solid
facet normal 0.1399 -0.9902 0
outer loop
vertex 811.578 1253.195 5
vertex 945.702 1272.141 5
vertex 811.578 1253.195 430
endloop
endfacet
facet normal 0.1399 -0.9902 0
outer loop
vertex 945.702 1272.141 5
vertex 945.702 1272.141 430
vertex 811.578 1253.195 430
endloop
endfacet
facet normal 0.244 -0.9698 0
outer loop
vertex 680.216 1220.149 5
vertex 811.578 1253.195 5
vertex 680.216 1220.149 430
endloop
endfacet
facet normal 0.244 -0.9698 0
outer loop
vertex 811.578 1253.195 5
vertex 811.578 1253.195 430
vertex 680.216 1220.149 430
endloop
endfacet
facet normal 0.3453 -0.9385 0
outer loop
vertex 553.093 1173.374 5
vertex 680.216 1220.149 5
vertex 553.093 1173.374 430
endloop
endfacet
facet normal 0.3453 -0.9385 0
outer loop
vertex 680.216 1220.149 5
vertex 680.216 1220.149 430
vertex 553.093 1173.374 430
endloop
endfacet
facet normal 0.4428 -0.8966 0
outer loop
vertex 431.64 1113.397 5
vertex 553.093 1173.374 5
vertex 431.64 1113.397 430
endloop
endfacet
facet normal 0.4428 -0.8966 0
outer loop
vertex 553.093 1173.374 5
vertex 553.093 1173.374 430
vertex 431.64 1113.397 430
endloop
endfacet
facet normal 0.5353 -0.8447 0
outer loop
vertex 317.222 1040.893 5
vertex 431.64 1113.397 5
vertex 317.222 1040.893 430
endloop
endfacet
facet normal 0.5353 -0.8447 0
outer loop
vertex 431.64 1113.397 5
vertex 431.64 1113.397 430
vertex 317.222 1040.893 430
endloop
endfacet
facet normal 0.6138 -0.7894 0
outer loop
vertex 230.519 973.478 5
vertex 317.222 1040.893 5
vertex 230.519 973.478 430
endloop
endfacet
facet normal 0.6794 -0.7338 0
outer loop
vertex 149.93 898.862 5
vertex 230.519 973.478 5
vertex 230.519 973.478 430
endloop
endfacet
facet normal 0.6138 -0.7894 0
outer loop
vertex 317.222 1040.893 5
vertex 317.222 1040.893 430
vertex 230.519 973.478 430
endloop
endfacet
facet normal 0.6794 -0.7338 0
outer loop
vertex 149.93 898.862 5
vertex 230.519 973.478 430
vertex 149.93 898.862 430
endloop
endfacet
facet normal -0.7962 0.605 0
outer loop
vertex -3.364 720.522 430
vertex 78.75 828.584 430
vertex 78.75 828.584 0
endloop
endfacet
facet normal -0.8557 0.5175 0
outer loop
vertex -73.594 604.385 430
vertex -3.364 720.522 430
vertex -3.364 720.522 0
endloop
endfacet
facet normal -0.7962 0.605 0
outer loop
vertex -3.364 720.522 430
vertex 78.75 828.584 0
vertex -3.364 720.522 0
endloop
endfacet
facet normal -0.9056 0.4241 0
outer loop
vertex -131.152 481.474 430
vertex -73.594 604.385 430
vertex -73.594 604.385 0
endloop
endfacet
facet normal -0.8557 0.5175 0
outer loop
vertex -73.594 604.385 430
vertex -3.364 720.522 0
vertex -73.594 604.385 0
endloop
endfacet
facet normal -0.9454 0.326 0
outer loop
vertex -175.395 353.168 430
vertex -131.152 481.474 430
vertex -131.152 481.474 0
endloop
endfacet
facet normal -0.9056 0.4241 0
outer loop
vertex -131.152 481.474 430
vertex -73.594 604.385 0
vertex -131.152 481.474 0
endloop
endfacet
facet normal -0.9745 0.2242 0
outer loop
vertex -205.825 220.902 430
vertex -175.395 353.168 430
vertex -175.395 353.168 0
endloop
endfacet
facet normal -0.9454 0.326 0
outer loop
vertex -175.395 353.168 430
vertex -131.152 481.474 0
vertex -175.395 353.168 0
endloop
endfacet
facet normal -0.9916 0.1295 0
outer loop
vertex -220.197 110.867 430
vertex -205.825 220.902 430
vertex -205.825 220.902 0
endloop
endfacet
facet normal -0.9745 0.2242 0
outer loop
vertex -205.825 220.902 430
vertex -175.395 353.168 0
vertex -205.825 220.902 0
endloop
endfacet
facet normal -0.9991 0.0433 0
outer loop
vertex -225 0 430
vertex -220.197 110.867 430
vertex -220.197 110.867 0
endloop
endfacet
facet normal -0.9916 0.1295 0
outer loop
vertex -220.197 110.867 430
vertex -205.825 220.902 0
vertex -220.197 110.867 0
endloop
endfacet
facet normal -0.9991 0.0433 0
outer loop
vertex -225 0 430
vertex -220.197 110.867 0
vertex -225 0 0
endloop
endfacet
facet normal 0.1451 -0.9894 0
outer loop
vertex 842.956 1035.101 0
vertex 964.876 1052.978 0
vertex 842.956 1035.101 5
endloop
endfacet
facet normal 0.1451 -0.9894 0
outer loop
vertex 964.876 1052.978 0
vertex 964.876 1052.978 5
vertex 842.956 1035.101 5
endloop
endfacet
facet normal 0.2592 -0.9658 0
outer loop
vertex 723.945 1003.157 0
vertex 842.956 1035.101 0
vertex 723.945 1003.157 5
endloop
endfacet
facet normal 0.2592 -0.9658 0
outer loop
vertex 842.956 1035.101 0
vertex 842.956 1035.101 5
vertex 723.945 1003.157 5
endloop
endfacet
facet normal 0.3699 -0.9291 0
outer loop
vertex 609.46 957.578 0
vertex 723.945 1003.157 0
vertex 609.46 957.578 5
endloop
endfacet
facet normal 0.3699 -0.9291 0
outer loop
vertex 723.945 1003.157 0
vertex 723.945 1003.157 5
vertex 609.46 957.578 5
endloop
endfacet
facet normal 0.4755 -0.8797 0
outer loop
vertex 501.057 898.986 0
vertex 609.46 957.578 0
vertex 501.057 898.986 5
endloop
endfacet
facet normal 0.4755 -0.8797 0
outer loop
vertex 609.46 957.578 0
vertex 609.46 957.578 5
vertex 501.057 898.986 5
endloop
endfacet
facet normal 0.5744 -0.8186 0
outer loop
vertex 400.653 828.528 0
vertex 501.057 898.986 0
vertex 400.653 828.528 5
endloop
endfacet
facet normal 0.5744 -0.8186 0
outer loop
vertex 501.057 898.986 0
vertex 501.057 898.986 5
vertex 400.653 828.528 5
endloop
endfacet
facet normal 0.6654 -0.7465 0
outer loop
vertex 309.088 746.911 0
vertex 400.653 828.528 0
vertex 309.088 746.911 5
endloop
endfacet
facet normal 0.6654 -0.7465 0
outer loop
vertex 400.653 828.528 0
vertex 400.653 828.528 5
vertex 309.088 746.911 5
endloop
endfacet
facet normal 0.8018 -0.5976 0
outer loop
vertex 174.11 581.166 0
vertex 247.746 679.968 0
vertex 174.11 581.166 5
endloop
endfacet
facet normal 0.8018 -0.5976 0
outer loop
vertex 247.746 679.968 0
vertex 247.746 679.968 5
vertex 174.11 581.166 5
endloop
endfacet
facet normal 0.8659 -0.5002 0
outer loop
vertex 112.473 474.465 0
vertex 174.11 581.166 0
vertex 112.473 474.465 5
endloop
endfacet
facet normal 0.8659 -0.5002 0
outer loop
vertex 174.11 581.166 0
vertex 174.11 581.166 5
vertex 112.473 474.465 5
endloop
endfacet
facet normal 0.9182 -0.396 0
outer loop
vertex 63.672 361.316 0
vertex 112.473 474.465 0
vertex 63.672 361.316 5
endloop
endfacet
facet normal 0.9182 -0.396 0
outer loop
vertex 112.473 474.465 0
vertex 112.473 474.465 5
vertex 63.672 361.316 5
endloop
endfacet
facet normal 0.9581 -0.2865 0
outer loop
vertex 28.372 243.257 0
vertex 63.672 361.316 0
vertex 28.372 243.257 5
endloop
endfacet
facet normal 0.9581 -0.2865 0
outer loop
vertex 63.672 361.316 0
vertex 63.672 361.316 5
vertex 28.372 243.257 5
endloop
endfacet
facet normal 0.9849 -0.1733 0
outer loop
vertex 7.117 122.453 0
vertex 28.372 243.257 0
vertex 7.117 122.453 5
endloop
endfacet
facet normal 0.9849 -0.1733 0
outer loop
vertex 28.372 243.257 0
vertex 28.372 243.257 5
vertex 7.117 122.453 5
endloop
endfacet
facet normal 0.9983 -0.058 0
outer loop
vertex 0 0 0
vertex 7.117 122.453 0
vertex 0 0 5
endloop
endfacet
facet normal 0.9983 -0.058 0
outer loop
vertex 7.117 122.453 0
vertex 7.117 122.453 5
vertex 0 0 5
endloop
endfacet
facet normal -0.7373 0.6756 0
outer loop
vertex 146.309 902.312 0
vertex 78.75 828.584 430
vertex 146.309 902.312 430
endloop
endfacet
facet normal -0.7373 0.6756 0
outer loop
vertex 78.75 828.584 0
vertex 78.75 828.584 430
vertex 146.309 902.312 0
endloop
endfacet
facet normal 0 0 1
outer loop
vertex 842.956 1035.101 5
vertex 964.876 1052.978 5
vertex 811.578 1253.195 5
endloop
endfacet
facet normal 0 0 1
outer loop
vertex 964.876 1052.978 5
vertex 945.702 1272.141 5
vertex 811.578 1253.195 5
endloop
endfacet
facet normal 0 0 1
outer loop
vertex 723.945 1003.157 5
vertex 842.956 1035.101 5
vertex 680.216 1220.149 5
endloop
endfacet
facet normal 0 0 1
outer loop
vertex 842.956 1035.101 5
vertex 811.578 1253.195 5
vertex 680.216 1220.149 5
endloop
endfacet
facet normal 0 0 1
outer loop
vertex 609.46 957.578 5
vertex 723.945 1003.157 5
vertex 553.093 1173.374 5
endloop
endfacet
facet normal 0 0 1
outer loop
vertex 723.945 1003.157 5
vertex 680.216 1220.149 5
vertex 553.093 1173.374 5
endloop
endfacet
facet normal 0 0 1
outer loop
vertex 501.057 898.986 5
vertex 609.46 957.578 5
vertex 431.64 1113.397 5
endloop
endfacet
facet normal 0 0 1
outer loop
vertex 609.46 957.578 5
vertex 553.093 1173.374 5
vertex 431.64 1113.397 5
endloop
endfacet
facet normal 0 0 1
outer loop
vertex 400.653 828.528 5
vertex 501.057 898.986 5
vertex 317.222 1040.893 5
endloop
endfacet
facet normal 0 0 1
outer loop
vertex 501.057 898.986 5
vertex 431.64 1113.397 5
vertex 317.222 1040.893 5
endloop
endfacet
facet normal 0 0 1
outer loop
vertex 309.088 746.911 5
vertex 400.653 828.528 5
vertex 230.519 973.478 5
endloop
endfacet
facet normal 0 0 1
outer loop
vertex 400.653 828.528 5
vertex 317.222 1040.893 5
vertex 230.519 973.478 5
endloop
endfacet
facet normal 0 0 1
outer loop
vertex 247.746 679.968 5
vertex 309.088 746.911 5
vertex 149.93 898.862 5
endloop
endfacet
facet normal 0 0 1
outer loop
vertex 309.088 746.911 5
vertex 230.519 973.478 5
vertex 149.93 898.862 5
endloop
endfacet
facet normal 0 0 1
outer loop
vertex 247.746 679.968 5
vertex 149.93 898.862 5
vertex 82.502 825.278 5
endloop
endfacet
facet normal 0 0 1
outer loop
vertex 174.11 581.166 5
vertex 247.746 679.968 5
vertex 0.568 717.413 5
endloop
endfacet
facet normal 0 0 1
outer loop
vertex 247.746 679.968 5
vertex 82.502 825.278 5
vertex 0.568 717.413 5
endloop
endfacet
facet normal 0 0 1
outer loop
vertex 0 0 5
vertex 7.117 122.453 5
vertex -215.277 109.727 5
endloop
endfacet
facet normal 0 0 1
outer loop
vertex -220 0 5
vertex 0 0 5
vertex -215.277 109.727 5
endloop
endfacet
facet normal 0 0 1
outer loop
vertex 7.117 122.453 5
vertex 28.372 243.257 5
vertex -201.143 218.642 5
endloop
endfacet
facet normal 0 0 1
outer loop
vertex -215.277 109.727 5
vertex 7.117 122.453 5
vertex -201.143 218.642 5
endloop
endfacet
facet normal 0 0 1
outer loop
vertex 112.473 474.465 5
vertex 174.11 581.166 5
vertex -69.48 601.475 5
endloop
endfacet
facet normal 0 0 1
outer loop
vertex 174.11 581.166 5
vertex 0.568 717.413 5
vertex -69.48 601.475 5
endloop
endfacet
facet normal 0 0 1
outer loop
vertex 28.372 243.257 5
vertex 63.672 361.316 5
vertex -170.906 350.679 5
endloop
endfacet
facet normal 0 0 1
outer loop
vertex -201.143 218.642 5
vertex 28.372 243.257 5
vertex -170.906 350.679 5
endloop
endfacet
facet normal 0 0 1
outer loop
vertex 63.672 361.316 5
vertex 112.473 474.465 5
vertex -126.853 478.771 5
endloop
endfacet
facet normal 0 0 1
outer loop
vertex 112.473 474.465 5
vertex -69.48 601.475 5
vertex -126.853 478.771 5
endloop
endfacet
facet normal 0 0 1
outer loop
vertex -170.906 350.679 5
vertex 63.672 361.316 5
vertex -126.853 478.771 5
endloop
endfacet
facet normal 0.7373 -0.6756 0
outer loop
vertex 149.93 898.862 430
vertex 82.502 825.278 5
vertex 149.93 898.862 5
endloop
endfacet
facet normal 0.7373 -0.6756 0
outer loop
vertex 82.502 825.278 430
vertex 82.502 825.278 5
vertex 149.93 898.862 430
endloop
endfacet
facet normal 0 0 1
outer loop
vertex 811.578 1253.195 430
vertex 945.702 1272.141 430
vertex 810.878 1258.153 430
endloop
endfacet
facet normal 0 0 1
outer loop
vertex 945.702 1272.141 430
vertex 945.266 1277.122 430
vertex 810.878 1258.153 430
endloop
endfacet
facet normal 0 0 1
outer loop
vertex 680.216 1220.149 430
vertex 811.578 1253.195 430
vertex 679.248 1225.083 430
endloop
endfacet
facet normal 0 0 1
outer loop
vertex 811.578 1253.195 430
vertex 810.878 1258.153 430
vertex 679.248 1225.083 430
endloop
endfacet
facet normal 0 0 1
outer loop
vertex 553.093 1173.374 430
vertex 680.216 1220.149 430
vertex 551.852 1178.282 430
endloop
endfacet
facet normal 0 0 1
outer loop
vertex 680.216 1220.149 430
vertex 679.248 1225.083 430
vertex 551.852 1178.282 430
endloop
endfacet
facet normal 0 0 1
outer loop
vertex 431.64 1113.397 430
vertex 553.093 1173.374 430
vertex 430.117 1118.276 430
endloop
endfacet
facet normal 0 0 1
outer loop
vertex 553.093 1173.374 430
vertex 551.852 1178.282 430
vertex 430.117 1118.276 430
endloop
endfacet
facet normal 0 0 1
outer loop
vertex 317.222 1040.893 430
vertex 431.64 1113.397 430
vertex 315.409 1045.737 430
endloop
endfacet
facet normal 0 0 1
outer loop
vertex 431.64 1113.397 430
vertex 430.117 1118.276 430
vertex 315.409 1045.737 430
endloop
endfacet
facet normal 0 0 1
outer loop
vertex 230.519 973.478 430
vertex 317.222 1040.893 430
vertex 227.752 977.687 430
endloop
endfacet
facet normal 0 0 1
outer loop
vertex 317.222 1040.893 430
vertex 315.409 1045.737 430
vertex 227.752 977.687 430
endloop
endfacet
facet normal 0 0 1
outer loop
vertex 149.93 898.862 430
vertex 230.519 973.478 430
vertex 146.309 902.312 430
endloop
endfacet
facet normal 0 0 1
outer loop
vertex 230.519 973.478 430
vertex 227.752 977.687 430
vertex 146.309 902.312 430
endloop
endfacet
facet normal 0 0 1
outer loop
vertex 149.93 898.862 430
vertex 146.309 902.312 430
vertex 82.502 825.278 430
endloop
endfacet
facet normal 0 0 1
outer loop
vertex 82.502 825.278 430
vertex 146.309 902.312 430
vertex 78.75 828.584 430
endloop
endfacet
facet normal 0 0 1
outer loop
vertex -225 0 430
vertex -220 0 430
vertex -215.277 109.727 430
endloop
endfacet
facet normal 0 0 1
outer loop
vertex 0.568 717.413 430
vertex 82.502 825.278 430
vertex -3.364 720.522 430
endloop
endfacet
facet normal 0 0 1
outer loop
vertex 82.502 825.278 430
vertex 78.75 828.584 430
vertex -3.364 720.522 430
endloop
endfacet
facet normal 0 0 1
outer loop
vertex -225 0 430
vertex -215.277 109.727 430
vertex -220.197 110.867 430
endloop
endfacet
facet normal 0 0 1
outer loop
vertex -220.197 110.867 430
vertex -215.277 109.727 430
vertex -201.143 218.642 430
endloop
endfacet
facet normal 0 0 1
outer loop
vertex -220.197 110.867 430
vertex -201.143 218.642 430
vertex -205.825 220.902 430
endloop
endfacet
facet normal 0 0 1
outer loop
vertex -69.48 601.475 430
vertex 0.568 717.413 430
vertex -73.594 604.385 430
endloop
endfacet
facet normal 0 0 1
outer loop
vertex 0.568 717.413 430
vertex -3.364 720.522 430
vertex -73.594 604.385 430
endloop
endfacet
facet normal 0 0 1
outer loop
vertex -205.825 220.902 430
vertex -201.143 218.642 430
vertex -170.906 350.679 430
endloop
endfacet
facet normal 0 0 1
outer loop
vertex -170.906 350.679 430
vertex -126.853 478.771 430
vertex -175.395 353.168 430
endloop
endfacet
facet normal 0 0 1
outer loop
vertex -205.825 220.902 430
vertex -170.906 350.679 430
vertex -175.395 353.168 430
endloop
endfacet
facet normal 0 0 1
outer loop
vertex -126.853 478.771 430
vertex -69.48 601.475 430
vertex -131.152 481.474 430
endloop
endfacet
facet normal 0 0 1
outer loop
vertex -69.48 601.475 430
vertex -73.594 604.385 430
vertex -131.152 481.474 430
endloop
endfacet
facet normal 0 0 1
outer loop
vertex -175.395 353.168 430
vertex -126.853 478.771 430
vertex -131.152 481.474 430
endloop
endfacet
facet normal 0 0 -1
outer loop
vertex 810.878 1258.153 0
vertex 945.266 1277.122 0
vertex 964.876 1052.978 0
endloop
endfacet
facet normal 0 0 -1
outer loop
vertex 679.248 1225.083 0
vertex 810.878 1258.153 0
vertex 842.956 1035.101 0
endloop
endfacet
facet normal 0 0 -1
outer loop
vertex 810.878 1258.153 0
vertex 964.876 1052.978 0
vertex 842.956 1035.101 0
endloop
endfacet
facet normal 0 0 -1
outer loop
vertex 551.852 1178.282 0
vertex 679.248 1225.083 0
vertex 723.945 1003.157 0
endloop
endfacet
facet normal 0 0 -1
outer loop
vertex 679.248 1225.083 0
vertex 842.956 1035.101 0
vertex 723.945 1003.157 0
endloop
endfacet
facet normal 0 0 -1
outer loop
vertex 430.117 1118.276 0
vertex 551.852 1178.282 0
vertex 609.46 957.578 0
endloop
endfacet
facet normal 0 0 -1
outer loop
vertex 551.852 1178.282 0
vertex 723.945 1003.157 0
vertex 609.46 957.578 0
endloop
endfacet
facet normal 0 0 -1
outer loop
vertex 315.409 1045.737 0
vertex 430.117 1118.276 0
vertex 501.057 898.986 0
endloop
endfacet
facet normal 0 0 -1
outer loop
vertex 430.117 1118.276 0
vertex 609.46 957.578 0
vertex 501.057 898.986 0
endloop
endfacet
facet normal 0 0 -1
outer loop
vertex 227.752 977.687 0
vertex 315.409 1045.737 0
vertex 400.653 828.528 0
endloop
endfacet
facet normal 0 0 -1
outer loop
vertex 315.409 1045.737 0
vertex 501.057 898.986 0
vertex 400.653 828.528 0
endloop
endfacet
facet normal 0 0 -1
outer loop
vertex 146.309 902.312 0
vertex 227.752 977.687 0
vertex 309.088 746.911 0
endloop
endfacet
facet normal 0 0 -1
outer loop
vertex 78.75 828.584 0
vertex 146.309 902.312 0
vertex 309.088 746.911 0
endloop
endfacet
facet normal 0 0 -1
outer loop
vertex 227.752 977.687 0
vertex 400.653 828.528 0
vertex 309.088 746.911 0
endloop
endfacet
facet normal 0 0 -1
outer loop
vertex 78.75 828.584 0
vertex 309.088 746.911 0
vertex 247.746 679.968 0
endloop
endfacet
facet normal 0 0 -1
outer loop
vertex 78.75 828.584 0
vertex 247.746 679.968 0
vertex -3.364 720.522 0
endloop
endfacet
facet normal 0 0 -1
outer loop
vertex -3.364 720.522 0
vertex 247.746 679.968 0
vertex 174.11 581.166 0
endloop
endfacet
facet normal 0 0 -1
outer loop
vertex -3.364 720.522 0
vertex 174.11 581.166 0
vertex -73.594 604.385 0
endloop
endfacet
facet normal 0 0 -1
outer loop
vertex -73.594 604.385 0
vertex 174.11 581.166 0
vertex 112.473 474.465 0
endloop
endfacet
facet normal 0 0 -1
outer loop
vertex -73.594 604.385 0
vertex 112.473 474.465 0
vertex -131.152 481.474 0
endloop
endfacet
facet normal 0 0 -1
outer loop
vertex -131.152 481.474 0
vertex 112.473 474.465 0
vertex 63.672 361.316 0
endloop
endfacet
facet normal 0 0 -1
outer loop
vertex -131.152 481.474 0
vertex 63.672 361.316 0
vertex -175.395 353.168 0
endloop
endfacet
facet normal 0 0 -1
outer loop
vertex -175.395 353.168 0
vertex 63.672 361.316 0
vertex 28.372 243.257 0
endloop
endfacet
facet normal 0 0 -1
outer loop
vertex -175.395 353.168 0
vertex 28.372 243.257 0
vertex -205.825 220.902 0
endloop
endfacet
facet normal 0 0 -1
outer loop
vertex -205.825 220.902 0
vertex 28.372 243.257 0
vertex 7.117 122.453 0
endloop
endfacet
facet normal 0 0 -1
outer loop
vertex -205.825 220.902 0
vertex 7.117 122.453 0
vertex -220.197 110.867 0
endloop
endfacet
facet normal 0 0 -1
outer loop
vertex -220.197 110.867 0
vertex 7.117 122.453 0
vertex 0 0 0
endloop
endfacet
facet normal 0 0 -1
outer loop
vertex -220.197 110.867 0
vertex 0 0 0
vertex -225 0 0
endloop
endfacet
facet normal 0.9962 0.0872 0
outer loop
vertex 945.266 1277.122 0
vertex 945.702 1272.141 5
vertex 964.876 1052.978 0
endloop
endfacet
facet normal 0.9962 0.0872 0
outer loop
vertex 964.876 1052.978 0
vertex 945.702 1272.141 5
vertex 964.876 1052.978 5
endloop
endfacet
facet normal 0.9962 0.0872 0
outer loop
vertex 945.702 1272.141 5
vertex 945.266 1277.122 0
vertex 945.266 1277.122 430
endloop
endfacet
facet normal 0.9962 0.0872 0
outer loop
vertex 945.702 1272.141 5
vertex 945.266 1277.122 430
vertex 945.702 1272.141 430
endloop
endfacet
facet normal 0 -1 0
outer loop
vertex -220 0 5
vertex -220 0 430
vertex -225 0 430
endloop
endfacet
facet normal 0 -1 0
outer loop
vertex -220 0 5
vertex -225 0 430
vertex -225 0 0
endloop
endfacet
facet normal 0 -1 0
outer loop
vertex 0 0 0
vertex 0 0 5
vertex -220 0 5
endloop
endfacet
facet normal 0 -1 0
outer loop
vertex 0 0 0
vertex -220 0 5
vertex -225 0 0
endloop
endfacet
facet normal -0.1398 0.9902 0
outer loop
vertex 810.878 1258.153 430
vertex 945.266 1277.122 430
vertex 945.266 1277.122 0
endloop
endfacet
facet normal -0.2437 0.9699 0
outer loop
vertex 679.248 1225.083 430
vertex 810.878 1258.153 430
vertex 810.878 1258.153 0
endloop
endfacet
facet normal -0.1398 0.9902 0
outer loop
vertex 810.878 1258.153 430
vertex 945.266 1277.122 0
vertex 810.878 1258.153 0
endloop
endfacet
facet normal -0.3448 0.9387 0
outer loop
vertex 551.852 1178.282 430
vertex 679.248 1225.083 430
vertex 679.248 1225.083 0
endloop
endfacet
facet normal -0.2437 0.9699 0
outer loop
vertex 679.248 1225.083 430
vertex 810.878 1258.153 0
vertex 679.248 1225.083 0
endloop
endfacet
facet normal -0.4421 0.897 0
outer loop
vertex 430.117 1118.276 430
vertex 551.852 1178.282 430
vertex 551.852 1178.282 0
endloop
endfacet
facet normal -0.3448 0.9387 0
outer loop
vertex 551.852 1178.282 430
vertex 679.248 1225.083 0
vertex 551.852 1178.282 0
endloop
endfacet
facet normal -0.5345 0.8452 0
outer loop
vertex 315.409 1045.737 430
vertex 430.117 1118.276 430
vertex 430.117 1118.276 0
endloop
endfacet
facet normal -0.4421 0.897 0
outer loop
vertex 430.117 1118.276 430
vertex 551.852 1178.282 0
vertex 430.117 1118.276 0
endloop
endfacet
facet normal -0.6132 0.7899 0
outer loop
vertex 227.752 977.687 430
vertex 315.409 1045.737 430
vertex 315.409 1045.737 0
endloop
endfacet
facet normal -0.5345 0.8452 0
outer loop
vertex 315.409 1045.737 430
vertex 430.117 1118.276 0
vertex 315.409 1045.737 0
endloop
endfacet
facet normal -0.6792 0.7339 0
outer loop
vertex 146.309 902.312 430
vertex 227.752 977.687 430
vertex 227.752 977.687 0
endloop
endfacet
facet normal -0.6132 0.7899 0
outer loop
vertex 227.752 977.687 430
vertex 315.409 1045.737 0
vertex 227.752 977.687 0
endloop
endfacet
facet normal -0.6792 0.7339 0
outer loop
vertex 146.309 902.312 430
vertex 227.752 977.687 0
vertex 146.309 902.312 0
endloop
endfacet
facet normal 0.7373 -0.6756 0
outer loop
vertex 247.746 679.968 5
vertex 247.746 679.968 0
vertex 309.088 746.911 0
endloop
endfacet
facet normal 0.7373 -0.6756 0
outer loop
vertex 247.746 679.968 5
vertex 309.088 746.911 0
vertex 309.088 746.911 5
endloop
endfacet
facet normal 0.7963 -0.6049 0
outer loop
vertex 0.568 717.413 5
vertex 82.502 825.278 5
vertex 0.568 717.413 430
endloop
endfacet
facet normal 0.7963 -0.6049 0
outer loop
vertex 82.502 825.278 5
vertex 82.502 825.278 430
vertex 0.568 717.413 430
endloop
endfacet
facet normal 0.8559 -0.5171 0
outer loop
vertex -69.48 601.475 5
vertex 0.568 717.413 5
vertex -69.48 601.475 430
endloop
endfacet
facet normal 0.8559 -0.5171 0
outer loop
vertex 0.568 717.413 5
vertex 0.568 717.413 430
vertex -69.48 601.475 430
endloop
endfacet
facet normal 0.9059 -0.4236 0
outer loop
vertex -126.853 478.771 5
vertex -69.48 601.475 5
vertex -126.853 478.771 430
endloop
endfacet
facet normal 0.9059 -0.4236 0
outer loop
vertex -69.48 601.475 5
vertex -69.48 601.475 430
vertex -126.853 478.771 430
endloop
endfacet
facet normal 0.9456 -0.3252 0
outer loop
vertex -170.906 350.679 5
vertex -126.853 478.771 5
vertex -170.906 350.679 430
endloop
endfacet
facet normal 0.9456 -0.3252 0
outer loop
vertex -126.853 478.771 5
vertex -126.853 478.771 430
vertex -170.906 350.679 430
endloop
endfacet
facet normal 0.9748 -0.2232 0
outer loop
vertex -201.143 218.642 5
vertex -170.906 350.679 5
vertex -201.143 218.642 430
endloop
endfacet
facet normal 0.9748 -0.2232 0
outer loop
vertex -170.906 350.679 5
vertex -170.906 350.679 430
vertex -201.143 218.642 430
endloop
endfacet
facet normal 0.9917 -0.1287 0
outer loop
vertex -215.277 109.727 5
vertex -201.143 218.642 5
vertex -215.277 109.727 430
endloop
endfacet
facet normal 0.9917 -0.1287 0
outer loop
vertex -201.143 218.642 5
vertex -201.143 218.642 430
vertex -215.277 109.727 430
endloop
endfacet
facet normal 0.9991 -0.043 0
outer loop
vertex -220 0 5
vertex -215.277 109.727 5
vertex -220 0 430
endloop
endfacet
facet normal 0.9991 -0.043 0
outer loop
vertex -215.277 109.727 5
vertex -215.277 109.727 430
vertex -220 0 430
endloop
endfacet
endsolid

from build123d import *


with BuildPart() as f2:
    # F2: sweep along a path in F1
    with BuildLine(Plane.XY) as f2_path:
        ThreePointArc((945.2663377975, 1277.1216029536), (512.5198472769, 1160.6314502419), (146.3091123304, 902.3115355107))
        Line((146.3091123304, 902.3115355107), (78.7500915689, 828.5838018297))
        ThreePointArc((78.7500915689, 828.5838018297), (-146.6694692914, 441.2525452569), (-225, 0))
    # F0 (on Front) → F2 (sweep)
    with BuildSketch(Plane.XZ):
        Polygon((-225, 0), (0, 0), (0, 5), (-220, 5), (-220, 430), (-225, 430), align=None)
    sweep(path=f2_path.line, transition=Transition.RIGHT)


solid = f2.part
